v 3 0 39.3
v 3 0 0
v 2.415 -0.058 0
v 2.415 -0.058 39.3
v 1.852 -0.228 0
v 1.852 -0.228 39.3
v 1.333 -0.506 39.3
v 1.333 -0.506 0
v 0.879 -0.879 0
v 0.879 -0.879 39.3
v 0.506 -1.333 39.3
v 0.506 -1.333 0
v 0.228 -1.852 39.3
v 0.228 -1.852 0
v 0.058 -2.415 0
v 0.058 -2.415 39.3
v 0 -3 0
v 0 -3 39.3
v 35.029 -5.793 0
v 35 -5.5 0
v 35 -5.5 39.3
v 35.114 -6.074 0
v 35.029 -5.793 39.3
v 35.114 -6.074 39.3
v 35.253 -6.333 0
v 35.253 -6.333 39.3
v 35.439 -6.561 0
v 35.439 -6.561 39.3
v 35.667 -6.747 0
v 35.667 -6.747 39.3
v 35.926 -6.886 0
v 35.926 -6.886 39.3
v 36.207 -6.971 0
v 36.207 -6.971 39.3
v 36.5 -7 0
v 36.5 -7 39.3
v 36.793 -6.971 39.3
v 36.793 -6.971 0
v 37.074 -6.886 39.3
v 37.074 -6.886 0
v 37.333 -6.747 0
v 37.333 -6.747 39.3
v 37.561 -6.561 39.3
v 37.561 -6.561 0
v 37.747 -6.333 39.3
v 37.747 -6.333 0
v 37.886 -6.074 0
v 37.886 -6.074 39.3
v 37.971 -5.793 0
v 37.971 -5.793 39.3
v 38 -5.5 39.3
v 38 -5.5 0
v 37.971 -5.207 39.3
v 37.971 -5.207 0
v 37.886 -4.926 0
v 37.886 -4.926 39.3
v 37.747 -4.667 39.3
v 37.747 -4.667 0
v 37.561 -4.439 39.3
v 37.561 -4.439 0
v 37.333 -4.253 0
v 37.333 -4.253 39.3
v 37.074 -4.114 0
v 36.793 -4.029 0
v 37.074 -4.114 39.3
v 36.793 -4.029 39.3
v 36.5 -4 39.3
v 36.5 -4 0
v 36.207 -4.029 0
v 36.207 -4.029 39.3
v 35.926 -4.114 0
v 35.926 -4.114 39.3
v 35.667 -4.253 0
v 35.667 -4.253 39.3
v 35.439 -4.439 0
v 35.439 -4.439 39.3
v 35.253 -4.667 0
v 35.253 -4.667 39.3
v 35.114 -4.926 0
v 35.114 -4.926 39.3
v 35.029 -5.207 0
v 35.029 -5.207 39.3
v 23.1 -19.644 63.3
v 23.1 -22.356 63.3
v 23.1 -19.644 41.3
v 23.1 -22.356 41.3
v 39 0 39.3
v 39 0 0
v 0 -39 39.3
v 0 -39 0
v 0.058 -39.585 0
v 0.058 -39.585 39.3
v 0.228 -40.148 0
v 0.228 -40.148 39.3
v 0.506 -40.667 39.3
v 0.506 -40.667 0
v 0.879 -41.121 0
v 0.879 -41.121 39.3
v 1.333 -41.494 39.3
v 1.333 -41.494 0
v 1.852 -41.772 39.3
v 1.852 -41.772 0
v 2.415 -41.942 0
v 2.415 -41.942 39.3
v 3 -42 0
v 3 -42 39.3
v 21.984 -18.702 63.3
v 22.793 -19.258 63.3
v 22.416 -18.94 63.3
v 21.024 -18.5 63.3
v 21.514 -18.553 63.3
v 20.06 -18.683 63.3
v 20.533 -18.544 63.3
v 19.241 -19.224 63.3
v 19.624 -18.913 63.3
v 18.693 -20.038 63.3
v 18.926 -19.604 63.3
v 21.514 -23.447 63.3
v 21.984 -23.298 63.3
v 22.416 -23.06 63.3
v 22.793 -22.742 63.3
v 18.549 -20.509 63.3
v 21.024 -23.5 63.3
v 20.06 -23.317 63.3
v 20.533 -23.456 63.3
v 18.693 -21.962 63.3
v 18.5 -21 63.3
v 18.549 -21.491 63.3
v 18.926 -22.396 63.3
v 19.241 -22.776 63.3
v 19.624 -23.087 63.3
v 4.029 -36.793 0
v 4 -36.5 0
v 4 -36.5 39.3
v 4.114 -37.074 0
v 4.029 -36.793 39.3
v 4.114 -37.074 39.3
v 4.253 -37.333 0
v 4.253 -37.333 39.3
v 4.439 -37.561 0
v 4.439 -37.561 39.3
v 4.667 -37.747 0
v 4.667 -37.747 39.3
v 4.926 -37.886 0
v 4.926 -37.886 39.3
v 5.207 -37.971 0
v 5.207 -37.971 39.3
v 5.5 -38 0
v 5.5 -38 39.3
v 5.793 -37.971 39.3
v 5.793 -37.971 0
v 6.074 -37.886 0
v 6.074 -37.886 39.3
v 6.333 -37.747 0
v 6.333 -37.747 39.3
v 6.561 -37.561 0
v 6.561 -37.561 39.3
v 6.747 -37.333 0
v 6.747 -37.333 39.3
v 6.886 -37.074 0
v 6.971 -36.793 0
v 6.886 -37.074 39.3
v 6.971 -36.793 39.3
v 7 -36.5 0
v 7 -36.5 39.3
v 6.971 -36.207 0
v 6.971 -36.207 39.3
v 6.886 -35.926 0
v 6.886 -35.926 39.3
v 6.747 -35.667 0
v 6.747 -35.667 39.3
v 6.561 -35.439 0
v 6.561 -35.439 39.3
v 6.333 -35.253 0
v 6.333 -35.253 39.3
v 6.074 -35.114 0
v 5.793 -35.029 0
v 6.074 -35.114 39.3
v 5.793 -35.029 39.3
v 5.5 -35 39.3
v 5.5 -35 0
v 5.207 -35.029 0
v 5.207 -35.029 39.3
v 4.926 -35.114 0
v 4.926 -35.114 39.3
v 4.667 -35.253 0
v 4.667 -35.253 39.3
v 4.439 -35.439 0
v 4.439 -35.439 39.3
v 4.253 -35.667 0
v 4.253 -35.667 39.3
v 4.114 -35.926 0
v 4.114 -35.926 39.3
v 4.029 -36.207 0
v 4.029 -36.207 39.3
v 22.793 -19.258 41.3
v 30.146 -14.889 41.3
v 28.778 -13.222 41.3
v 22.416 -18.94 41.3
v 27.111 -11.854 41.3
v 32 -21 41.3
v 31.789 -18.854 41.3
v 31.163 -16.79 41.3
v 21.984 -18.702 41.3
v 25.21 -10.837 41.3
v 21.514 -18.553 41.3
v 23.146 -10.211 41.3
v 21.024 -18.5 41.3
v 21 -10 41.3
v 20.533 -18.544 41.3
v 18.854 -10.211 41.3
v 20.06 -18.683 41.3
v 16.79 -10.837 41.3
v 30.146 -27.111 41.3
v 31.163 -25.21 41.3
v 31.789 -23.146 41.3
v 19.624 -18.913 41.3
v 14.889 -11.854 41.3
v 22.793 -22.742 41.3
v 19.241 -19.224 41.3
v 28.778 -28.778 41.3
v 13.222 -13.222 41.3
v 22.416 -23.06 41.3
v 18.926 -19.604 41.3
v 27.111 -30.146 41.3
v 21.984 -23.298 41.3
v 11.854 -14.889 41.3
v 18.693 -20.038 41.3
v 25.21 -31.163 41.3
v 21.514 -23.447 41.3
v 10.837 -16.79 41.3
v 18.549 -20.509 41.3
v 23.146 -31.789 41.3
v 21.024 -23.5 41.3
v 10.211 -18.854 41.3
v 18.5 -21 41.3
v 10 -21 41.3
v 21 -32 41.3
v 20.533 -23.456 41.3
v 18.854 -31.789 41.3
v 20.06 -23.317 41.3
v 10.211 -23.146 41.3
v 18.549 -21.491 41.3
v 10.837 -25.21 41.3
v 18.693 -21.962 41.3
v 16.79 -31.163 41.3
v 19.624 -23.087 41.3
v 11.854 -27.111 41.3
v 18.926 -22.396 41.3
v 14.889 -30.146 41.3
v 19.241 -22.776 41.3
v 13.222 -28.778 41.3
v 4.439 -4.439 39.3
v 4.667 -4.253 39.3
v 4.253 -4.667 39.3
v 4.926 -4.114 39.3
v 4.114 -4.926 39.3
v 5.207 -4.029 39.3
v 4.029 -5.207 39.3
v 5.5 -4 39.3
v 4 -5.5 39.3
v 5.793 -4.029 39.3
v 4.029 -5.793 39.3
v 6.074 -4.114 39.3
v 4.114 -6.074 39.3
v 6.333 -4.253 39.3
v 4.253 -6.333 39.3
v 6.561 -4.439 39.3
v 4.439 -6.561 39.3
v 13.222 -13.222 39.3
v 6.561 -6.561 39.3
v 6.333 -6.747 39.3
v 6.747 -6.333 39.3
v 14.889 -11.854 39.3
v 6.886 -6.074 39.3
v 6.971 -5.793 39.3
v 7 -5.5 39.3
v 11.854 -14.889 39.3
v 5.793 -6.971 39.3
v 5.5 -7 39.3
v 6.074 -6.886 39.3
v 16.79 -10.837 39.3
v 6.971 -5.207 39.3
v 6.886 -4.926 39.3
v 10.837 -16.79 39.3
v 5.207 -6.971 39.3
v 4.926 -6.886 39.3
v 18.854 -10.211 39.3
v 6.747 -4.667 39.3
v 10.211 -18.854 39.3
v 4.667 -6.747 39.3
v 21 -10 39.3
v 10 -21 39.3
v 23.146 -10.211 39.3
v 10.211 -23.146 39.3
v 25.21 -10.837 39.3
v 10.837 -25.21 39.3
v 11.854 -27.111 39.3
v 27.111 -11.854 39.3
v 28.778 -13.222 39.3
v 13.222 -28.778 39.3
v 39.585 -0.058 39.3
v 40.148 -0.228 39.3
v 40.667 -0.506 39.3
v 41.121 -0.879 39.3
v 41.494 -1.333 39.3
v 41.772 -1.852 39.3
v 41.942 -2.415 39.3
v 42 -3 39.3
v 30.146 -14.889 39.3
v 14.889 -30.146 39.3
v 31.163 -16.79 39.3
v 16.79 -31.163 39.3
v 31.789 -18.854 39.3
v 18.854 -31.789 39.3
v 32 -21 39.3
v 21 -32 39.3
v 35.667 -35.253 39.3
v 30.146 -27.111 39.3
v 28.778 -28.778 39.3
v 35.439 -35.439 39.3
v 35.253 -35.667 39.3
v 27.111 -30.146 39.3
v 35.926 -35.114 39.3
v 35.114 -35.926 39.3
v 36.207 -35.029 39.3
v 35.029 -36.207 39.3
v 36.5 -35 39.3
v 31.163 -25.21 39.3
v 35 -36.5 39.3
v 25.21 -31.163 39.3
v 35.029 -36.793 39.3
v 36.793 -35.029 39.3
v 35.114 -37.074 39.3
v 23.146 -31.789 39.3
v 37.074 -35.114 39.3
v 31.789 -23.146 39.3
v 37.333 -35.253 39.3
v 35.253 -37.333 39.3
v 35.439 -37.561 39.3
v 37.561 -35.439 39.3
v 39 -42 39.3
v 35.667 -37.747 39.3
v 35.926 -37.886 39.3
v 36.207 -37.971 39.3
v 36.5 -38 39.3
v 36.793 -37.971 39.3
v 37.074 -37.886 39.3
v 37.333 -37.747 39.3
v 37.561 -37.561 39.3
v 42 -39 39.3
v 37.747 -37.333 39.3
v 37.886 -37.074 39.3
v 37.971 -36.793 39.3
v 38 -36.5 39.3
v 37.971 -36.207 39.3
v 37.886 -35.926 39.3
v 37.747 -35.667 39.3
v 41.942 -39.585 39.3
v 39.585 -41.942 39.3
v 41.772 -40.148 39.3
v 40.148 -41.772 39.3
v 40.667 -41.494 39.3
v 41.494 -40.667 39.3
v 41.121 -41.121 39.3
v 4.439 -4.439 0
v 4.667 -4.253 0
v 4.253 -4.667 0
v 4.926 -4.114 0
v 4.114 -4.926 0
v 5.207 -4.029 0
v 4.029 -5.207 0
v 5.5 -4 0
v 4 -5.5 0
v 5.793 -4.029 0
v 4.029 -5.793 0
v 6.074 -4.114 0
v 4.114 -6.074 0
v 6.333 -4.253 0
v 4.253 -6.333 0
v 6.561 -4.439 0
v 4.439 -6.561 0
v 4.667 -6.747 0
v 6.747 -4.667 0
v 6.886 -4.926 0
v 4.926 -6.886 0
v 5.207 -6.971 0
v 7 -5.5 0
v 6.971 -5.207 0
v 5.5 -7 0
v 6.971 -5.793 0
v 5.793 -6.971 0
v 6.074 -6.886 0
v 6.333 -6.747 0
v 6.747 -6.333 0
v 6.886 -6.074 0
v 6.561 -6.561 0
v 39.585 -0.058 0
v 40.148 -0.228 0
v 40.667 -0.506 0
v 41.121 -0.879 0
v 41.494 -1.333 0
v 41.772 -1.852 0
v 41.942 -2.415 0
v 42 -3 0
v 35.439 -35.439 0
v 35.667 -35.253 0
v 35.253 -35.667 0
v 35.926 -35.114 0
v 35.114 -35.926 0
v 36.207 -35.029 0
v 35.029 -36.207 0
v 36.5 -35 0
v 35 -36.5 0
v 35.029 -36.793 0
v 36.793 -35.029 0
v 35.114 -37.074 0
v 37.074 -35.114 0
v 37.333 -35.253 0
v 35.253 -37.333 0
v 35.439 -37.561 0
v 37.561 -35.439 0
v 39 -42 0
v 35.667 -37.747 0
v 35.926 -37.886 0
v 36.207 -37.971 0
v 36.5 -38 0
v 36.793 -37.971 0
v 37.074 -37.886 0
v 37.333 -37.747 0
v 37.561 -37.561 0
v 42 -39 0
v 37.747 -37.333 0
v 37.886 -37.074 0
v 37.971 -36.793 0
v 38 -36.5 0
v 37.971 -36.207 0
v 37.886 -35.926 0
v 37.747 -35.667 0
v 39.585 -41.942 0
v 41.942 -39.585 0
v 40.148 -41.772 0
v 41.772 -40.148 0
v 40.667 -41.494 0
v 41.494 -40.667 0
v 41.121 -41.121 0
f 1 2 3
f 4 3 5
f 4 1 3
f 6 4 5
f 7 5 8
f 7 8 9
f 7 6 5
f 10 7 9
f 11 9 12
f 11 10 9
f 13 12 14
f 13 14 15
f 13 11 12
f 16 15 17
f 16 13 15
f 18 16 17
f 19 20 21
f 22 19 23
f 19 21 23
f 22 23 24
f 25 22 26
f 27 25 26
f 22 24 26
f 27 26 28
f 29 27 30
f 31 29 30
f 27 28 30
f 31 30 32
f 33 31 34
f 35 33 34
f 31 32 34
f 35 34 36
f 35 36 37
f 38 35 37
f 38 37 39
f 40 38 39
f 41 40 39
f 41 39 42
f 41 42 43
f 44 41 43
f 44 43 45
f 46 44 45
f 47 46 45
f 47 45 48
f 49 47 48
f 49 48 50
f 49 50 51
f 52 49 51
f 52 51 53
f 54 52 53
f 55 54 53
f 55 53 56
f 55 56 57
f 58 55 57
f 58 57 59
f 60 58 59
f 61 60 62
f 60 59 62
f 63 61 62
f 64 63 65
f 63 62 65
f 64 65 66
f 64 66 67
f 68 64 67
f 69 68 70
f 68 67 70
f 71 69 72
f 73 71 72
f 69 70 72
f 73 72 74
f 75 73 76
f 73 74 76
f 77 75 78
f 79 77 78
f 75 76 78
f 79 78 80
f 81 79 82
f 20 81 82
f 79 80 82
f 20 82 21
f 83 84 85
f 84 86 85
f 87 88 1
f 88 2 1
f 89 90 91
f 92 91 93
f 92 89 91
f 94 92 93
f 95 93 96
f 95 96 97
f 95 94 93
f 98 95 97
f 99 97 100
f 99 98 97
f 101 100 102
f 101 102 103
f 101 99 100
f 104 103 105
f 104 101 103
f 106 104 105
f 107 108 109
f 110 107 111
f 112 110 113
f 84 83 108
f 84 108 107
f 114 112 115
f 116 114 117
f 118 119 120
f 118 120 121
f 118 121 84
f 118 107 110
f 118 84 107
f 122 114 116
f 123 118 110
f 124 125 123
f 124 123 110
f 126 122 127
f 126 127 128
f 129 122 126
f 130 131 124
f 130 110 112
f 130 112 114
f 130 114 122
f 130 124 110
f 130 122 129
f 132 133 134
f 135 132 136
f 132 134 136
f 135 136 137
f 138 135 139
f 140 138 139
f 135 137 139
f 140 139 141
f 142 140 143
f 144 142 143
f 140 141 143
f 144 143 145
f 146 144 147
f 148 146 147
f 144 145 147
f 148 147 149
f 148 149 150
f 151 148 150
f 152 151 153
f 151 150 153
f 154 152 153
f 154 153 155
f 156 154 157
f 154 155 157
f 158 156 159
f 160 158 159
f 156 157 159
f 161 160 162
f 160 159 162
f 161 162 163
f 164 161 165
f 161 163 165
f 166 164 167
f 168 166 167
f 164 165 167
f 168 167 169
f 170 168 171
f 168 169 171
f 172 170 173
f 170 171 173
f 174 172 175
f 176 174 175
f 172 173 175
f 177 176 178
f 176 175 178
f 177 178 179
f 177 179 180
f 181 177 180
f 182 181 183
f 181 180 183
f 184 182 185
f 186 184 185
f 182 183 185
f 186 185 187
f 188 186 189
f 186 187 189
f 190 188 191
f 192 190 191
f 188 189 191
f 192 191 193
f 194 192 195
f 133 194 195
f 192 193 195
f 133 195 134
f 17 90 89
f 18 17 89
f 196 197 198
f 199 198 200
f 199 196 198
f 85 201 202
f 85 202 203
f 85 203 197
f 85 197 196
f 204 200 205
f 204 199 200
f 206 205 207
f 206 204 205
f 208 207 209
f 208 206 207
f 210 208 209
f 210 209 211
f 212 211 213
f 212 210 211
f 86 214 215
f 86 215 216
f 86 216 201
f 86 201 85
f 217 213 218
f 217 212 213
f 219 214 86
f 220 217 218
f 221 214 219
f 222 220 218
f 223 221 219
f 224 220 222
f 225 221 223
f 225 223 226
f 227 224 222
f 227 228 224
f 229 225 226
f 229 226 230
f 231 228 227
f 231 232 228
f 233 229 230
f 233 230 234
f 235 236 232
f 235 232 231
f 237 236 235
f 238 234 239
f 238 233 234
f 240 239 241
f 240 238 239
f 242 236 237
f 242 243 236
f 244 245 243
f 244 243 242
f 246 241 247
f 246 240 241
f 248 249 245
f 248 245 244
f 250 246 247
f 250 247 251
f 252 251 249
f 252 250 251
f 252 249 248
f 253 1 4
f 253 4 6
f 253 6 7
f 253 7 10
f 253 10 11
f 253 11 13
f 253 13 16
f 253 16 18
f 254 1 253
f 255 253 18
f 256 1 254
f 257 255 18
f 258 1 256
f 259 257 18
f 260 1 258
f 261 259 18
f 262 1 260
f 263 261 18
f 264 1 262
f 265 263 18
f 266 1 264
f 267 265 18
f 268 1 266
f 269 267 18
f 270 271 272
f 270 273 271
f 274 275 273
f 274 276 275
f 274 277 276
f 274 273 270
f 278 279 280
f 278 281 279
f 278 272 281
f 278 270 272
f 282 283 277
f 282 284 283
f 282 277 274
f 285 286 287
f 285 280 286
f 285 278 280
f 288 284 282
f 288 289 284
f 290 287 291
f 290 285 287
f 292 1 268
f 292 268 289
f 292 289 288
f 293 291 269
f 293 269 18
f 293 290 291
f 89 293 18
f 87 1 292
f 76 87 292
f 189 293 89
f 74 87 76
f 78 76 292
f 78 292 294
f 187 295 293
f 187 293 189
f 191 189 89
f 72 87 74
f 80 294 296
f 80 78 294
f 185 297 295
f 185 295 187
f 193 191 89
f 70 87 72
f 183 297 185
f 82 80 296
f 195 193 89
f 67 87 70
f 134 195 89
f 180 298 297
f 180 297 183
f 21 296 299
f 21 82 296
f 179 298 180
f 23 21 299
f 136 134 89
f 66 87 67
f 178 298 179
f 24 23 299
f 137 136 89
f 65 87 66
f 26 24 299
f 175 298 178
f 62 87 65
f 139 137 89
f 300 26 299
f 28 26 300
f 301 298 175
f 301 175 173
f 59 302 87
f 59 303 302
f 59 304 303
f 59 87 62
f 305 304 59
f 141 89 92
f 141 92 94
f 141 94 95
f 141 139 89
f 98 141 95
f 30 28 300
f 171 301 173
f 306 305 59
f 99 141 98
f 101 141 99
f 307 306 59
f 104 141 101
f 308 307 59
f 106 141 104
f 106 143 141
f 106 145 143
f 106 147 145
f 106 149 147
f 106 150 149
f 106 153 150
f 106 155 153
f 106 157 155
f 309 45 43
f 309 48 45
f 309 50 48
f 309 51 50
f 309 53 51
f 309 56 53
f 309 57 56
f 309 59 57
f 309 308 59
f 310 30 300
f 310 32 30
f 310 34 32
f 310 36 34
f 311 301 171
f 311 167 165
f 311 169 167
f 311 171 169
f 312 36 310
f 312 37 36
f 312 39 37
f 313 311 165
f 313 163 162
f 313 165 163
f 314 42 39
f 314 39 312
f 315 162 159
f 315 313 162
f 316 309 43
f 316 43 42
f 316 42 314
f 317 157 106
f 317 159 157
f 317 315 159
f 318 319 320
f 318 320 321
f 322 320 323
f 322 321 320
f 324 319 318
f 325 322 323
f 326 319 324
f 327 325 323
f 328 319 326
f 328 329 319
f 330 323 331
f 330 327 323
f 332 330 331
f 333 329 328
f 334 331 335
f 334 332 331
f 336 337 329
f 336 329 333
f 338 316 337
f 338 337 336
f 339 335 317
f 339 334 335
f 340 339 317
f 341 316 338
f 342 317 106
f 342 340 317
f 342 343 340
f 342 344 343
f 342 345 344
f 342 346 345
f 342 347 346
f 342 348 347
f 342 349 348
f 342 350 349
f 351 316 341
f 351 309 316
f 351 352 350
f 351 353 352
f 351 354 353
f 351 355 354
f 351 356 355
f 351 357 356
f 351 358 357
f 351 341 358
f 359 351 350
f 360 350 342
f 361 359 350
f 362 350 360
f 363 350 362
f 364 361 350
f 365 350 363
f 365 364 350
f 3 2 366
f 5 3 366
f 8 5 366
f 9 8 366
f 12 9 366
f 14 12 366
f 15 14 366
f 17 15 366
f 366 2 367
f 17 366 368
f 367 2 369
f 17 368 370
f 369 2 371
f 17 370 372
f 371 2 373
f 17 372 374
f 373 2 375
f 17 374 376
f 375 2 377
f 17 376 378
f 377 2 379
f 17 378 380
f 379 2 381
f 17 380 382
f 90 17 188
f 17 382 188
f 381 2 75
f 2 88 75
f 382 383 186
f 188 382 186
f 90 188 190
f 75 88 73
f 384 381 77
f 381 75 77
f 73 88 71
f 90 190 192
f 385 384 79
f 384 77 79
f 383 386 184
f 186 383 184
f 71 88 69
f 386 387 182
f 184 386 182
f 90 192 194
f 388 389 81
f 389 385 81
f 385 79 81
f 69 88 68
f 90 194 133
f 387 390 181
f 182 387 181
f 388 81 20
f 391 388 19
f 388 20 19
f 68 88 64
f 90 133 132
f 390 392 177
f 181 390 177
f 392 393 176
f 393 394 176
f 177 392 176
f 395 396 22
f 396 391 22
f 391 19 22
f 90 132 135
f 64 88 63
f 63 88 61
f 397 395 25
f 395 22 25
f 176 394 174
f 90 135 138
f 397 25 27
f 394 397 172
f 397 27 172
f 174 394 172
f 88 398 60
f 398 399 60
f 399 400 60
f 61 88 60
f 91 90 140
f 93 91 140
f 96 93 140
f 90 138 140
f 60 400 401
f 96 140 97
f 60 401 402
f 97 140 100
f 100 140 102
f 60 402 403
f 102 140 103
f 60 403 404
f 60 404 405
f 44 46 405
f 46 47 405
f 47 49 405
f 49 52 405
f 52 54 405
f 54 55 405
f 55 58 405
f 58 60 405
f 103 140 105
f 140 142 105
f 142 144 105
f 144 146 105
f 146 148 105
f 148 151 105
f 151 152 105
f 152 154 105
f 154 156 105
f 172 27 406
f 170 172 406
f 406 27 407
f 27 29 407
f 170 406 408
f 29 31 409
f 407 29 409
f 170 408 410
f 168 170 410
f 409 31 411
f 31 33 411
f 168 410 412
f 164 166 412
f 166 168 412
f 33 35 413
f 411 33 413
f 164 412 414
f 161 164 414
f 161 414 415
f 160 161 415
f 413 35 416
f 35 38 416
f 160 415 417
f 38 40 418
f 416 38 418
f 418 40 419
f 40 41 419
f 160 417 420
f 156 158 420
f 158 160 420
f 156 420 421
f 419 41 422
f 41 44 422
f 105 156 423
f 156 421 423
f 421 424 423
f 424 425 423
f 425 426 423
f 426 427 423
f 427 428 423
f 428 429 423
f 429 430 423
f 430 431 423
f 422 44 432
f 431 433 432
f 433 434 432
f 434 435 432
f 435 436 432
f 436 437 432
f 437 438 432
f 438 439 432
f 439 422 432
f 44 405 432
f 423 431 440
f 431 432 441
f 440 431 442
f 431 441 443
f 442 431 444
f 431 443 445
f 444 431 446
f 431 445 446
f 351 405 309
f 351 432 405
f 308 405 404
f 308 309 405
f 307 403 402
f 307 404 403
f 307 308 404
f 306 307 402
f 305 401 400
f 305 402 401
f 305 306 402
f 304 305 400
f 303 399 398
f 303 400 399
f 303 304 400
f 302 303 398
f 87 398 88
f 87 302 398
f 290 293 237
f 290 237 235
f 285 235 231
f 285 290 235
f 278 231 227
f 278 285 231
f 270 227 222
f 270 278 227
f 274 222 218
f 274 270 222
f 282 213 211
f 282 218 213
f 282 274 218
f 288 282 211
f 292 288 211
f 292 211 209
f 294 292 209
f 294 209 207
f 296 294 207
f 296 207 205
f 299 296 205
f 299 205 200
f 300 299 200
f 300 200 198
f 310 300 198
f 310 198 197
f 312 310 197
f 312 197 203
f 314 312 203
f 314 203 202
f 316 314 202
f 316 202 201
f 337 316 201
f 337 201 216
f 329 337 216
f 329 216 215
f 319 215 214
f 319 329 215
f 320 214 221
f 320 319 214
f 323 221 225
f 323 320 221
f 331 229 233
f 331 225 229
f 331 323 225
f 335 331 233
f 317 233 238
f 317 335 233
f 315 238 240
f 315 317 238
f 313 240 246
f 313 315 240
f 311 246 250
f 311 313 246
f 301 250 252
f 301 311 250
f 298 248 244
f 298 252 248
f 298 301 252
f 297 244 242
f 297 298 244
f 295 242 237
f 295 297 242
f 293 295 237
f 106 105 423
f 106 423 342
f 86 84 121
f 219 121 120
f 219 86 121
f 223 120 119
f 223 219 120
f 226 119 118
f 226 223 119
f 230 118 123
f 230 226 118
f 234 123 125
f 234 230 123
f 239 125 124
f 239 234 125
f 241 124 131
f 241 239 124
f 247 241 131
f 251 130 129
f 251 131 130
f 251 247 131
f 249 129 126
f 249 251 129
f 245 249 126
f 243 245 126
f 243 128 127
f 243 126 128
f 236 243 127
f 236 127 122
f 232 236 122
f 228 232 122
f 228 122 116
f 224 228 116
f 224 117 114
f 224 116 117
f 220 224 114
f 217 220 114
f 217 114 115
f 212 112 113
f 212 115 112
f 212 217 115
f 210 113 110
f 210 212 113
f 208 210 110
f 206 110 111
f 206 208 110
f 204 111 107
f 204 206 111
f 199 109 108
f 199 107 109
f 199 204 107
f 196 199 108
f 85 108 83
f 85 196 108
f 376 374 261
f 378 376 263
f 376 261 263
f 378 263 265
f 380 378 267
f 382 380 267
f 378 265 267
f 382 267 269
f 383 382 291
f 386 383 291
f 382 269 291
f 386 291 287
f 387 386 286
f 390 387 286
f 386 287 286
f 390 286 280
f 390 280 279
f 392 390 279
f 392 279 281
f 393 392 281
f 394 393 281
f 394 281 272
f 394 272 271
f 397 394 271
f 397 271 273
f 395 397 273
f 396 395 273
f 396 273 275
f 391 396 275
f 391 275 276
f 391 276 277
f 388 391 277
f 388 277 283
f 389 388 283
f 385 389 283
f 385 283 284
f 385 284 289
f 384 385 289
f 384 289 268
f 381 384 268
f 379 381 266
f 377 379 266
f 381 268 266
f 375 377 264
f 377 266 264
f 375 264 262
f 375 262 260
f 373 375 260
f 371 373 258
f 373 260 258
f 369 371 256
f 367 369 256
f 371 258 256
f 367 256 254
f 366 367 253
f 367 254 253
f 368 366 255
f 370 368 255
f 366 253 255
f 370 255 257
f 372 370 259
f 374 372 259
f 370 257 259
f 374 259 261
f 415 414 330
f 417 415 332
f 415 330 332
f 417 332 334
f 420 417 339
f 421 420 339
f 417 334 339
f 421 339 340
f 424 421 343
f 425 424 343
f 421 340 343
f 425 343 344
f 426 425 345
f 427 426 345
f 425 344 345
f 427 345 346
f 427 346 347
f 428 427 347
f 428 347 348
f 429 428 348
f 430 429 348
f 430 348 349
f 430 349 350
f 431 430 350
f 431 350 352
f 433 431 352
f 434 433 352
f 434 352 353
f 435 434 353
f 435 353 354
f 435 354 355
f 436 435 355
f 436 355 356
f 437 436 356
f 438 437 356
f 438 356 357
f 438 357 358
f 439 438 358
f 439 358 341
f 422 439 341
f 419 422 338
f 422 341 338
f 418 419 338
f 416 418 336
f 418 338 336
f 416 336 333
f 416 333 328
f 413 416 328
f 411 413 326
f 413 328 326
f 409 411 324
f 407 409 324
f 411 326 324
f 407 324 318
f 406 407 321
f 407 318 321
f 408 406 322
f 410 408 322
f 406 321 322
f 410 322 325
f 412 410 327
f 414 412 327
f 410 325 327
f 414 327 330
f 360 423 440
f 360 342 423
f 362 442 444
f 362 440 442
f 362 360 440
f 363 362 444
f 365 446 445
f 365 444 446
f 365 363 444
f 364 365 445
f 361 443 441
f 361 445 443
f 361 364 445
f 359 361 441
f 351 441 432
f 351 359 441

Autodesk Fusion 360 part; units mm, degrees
box "BoxPrimitive1" add length 42 width 42 height 39.3 placed x (0, -1, 0) y (1, 0, 0) z (0, 0, 1) at (0, 0, 0)
sketch "Sketch2" plane through (0, 0, 39.3) normal (0, 0, 1) x (-1, 0, 0)
  line L0 (0, 42) -> (-42, 42)
  line L1 (-42, 42) -> (-42, 0)
  line L2 (-42, 0) -> (0, 0)
  line L3 (0, 0) -> (0, 42)
  circle A0 centre (-21, 21) radius 11
  line L4 (-23.1, 22.3565) -> (-23.1, 19.6435)
  arc A1 (-23.1, 19.6435) -> (-23.1, 22.3565) centre (-21, 21) ccw
  circle A2 centre (-36.5, 36.5) radius 1.5
  circle A3 centre (-5.5, 36.5) radius 1.5
  line L5 (-5.5, 36.5) -> (-36.5, 36.5) construction
  line L6 (-36.5, 36.5) -> (-36.5, 5.5) construction
  circle A4 centre (-36.5, 5.5) radius 1.5
  circle A5 centre (-5.5, 5.5) radius 1.5
  point P0 (-21, 0)
  point P1 (0, 21)
  point P2 (-21, 36.5)
  point P3 (-21, 42)
  point P4 (-36.5, 21)
  point P5 (-42, 21)
  dimension "d8" = 22
  dimension "d11" = 5
  dimension "d14" = 2.1
  dimension "d17" = 3
  dimension "d20" = 3
  dimension "d21" = 31
  dimension "d22" = 31
  dimension "d23" = 3
  dimension "d24" = 3
extrude "Extrude2" add sketch "Sketch2" along normal blind 24 contours L4 A1
extrude "Extrude1" add sketch "Sketch2" along normal blind 2 contours A0 | L4 A1
fillet "Fillet1" radius 3 4 edges at (0, 0, 19.65) (0, -42, 19.65) (42, -42, 19.65) (42, 0, 19.65)
extrude "Extrude3" cut sketch "Sketch2" against normal blind 40 contours A2 | A3 | A4 | A5
